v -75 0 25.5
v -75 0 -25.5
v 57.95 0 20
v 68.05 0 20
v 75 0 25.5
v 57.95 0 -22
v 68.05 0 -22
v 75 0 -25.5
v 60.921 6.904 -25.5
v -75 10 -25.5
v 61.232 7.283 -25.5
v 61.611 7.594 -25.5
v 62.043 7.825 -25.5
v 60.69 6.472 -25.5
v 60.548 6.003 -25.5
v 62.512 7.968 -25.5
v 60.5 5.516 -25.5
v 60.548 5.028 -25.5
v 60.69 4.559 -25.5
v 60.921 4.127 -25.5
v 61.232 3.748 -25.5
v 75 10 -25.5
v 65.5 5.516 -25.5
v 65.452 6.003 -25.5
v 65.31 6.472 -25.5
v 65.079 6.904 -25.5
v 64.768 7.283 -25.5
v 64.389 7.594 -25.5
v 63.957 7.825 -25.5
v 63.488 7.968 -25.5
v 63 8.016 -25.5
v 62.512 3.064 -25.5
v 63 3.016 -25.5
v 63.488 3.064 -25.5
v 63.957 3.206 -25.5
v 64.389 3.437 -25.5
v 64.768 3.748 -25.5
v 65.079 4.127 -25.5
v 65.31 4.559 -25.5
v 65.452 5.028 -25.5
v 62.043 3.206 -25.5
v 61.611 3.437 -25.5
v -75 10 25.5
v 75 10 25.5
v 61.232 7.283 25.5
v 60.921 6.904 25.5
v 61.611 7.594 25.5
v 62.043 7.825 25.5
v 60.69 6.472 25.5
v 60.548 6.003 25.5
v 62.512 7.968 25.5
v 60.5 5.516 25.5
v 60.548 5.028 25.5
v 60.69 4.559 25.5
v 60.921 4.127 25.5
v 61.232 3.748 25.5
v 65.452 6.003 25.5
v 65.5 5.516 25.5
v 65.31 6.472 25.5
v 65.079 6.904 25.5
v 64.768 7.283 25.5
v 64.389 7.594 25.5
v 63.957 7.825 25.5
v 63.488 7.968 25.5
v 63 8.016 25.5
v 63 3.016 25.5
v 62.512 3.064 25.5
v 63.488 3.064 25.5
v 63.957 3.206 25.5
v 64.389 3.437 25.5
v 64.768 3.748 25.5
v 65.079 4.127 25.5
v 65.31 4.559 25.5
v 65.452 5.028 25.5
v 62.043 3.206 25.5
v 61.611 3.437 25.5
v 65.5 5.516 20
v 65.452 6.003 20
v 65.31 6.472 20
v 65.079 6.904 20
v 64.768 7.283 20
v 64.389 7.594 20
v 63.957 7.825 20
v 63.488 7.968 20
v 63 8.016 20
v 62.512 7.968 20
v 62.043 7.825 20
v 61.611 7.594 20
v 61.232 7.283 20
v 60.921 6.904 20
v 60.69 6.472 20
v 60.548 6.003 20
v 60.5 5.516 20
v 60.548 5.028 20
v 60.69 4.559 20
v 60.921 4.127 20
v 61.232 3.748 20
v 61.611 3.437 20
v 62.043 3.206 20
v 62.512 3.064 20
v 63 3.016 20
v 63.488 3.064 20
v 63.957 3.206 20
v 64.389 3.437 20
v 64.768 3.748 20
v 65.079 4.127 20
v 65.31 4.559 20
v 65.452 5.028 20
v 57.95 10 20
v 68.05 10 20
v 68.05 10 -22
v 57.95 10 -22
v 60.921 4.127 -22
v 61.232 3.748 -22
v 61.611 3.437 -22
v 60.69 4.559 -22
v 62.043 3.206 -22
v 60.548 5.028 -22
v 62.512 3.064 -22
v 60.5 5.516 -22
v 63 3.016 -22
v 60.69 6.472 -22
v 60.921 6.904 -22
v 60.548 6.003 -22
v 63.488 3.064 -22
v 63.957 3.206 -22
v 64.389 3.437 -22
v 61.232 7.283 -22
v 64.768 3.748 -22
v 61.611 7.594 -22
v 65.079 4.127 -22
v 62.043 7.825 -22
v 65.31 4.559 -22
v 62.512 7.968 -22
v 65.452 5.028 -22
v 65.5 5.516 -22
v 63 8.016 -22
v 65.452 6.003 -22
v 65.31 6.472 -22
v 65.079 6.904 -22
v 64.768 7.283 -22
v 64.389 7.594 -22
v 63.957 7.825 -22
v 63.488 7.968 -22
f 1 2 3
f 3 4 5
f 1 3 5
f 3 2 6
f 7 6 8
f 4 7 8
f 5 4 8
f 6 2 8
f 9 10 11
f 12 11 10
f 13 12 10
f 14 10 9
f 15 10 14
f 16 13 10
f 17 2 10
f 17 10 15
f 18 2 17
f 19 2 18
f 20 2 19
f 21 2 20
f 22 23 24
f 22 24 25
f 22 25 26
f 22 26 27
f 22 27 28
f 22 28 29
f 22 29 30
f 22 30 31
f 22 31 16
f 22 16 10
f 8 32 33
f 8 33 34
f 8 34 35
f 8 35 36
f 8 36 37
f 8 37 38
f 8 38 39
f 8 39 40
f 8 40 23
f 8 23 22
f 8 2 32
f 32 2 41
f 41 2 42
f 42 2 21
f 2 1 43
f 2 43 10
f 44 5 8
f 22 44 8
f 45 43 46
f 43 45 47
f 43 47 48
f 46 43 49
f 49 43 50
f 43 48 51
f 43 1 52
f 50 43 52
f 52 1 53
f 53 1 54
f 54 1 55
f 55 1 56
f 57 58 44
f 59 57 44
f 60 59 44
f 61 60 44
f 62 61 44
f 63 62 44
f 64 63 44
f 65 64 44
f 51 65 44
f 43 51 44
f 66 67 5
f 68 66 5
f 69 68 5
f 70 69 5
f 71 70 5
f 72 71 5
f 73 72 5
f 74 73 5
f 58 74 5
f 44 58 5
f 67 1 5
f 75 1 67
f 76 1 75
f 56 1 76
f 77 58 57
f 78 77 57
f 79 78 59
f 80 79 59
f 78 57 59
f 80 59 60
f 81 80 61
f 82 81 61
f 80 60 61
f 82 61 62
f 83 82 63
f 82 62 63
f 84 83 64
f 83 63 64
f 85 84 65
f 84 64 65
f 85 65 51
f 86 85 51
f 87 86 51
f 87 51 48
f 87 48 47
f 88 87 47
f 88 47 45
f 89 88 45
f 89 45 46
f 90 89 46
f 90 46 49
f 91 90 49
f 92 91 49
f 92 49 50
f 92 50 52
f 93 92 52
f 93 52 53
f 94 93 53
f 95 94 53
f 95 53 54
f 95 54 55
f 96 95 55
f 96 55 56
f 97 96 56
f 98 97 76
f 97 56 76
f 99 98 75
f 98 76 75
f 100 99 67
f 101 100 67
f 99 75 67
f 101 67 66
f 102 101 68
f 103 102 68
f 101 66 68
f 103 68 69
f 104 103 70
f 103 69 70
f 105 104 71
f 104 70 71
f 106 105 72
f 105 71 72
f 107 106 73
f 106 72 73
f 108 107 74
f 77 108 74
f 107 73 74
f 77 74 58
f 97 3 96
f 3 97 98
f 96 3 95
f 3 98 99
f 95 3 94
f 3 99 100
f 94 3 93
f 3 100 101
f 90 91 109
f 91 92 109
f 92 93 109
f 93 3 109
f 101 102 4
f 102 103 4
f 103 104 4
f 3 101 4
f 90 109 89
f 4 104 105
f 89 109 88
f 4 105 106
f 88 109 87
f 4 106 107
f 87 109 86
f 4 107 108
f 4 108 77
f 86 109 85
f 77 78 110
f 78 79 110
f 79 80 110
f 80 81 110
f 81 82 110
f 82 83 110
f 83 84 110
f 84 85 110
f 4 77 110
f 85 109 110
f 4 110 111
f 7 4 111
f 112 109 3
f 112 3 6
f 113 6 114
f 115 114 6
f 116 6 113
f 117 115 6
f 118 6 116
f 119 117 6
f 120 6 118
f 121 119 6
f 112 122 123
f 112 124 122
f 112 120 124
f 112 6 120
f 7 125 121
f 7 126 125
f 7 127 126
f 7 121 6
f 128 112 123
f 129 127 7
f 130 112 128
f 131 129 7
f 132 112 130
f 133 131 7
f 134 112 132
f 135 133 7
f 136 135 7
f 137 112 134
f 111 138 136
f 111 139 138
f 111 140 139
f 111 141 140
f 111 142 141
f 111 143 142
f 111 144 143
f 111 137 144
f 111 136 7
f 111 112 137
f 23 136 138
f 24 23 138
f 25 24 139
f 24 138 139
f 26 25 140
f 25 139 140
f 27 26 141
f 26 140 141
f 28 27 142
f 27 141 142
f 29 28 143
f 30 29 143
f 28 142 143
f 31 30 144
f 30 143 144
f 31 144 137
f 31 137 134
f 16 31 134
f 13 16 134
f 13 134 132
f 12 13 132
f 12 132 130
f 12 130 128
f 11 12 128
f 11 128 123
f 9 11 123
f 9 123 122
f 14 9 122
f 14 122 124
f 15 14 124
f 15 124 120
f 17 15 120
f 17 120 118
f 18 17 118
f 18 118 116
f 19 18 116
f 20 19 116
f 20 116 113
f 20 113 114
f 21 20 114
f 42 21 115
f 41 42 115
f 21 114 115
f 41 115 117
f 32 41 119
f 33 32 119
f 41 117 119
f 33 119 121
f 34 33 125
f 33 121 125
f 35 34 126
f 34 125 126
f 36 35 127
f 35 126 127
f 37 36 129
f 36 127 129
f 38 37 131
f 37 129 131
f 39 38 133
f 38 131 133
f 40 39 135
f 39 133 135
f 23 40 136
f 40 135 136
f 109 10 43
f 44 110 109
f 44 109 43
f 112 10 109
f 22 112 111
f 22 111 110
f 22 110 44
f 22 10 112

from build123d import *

# Parameters (mm, degrees)
SKETCH1_W           = 150
SKETCH1_H           = 51
BOSS_EXTRUDE1_DEPTH = 10
SKETCH2_W           = 10.1
SKETCH2_H           = 42
CUT_EXTRUDE1_DEPTH  = 80.845162659
SKETCH5_R           = 2.5
CUT_EXTRUDE4_DEPTH  = 92.246917756


with BuildPart() as part:
    # Sketch1 → Boss-Extrude1 (new body)
    with BuildSketch(Plane(origin=(0, 0, 0), x_dir=(1, 0, 0), z_dir=(0, 1, 0))):
        Rectangle(SKETCH1_W, SKETCH1_H)
    extrude(amount=BOSS_EXTRUDE1_DEPTH)

    # Sketch2 → Cut-Extrude1 (cut, through all)
    with BuildSketch(Plane(origin=(0, 10, 0), x_dir=(1, 0, 0), z_dir=(0, 1, 0))):
        with Locations((63, 1)):
            Rectangle(SKETCH2_W, SKETCH2_H)
    extrude(amount=-CUT_EXTRUDE1_DEPTH, mode=Mode.SUBTRACT)

    # Sketch5 → Cut-Extrude4 (cut, through all)
    with BuildSketch(Plane.XY.offset(25.5)):
        with Locations((63, 5.515561539)):
            Circle(SKETCH5_R)
    extrude(amount=-CUT_EXTRUDE4_DEPTH, mode=Mode.SUBTRACT)


solid = part.part
